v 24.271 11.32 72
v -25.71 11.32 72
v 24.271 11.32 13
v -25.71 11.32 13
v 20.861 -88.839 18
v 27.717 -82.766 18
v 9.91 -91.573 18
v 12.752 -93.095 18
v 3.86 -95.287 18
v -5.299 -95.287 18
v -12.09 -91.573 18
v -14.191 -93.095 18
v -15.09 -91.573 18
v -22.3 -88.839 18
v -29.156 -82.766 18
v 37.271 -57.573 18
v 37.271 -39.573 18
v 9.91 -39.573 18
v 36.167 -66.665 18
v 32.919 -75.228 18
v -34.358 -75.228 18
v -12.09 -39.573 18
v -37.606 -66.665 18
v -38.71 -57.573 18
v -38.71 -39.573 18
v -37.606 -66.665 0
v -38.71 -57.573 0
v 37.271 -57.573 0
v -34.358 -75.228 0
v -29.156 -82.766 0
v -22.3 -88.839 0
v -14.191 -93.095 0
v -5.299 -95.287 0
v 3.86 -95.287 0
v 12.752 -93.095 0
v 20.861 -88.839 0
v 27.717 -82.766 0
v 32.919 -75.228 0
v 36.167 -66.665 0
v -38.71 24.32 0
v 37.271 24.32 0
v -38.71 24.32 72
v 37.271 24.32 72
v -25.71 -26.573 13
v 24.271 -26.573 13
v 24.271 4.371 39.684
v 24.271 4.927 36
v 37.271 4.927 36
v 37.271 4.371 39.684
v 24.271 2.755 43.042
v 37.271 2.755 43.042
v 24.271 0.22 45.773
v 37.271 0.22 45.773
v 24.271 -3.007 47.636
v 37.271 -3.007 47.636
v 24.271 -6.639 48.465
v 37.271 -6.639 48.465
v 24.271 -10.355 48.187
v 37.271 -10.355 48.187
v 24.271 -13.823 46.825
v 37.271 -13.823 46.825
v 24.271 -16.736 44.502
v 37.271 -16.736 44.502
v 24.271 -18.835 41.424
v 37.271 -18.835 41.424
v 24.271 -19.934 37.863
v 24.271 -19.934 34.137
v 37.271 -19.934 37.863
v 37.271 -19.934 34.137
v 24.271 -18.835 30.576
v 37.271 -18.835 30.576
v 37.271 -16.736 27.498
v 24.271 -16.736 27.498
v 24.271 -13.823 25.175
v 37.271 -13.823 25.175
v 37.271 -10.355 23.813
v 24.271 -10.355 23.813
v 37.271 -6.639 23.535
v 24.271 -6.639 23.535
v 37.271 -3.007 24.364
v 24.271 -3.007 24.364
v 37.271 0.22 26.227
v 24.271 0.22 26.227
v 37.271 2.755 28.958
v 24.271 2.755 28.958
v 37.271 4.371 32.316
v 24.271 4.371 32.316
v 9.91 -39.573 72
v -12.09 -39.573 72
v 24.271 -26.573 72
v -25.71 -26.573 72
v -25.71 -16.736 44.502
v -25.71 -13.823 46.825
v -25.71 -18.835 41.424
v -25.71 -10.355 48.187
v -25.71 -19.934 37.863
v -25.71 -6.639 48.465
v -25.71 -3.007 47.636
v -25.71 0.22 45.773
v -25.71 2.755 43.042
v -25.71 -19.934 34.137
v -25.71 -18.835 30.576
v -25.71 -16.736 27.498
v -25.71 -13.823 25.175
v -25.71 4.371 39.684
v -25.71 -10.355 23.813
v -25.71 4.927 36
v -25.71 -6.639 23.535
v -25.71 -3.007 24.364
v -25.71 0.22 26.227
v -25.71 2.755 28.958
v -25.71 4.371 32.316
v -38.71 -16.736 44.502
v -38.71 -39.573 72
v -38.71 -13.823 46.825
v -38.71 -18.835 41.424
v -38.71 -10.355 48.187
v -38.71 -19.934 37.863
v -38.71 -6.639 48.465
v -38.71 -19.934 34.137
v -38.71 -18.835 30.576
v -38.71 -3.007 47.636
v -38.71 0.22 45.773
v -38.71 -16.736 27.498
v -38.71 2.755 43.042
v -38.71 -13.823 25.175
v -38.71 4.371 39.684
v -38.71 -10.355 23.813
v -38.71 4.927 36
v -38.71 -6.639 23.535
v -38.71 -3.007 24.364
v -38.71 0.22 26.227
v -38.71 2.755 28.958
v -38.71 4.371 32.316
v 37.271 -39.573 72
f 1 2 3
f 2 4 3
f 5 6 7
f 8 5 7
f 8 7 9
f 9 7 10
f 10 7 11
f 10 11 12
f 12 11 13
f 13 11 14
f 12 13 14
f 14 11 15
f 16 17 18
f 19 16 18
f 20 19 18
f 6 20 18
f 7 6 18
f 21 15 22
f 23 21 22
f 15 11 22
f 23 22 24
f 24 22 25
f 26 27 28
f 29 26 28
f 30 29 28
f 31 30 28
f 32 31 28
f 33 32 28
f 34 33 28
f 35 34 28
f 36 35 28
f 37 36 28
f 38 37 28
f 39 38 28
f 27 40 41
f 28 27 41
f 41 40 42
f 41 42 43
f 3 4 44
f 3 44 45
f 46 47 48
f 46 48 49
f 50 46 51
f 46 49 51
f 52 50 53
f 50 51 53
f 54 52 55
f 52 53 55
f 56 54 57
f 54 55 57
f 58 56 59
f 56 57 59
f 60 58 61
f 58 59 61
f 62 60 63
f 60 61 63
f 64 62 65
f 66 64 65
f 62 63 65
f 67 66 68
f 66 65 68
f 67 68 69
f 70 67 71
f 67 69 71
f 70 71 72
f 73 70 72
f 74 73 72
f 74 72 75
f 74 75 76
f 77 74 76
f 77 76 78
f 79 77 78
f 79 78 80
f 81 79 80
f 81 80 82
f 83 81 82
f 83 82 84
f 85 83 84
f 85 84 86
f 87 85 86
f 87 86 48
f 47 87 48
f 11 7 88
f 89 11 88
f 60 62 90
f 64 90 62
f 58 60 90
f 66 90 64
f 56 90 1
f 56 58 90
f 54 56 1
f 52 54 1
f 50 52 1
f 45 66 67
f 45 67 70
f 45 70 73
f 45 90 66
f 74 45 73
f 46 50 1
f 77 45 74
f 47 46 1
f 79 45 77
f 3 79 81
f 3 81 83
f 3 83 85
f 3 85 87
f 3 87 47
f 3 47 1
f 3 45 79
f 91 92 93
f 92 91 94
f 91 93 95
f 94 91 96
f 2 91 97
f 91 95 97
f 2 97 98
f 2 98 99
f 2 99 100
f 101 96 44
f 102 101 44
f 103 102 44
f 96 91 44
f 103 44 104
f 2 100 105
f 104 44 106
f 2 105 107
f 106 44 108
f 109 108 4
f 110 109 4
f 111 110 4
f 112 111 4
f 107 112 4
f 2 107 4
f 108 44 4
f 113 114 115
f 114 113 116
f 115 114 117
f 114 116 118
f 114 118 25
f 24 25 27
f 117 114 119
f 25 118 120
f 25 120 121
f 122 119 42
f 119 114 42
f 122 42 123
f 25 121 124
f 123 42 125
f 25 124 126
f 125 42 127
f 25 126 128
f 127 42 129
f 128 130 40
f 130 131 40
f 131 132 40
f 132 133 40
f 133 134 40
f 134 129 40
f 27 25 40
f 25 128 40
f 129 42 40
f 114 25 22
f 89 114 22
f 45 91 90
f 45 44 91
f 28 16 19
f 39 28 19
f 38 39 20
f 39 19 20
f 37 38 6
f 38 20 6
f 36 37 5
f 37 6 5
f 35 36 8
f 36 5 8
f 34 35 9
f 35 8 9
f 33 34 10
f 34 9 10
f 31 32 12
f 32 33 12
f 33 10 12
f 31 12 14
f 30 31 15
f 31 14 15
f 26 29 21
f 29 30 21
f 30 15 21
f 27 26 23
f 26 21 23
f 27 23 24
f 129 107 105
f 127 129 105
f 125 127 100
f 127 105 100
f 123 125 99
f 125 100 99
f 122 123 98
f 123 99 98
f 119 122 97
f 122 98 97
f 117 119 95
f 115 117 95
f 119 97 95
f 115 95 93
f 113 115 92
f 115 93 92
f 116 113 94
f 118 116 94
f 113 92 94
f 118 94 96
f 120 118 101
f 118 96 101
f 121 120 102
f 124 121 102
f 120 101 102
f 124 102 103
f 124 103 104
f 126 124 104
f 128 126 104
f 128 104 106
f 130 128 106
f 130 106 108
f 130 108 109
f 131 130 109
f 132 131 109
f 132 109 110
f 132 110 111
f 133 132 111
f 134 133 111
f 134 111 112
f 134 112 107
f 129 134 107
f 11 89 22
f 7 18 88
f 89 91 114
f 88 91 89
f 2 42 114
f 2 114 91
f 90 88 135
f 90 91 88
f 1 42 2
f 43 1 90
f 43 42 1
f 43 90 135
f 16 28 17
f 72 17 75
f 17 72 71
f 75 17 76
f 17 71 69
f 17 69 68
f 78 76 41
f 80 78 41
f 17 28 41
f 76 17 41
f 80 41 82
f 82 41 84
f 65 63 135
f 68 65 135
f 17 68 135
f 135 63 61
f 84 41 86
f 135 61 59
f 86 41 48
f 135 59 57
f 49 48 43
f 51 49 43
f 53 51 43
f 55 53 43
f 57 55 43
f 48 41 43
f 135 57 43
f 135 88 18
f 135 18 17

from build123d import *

# Parameters (mm, degrees)
F0_W      = 75.9807191789
F0_H      = 63.8928804547
F1_DEPTH  = 72
F2_T      = -13
F3_R      = 12.5
F4_DEPTH  = 100
F6_DEPTH  = 56
F8_DEPTH  = 52
F10_DEPTH = 25
F12_DEPTH = 25


with BuildPart() as f1:
    # F0 (on Top) → F1 (new body)
    with BuildSketch(Plane.XY):
        with Locations((-0.7195156068, -7.6268529519)):
            Rectangle(F0_W, F0_H)
    extrude(amount=F1_DEPTH)

    # F2
    f2_openings = [f1.faces().sort_by_distance(p)[0] for p in [
        (-0.719516, -7.626853, 72),
    ]]
    offset(amount=F2_T, openings=f2_openings)

    # F3 (on face) → F4 (cut)
    with BuildSketch(Plane.YZ.offset(37.2708439827)):
        with Locations((-7.5732931793, 36)):
            Circle(F3_R)
    extrude(amount=-F4_DEPTH, mode=Mode.SUBTRACT)

    # F5 (on face) → F6 (join)
    with BuildSketch(Plane.XZ.offset(39.5732931793)):
        Polygon((-38.7098751962, 0), (37.2708439827, 0), (37.2708439827, 18), (10.2804843932, 18), (-11.7195156068, 18), (-38.7098751962, 18), align=None)
    extrude(amount=F6_DEPTH)

    # F7 (on face) → F8 (join)
    with BuildSketch(Plane.XZ.offset(39.5732931793)):
        Polygon((-0.7098751962, 72), (-12.0902489871, 72), (-12.0902489871, 18), (9.9097510129, 18), (9.9097510129, 72), align=None)
    extrude(amount=F8_DEPTH)

    # F9 (on face) → F10 (cut)
    with BuildSketch(Plane.YZ.offset(9.9097510129)):
        Polygon((-91.5732931793, 72), (-91.5732931793, 18), (-39.5732931793, 72), align=None)
    extrude(amount=-F10_DEPTH, mode=Mode.SUBTRACT)

    # F11 (on face) → F12 (cut)
    with BuildSketch(Plane.XY.offset(18)):
        with BuildLine():
            ThreePointArc((37.2708439827, -57.5732931793), (-0.7195156068, -95.5636527687), (-38.7098751962, -57.5732931793))
            Line((-38.7098751962, -57.5732931793), (-38.7098751962, -95.5732931793))
            Line((-38.7098751962, -95.5732931793), (37.2708439827, -95.5732931793))
            Line((37.2708439827, -95.5732931793), (37.2708439827, -57.5732931793))
        make_face()
    extrude(amount=-F12_DEPTH, mode=Mode.SUBTRACT)


solid = f1.part
